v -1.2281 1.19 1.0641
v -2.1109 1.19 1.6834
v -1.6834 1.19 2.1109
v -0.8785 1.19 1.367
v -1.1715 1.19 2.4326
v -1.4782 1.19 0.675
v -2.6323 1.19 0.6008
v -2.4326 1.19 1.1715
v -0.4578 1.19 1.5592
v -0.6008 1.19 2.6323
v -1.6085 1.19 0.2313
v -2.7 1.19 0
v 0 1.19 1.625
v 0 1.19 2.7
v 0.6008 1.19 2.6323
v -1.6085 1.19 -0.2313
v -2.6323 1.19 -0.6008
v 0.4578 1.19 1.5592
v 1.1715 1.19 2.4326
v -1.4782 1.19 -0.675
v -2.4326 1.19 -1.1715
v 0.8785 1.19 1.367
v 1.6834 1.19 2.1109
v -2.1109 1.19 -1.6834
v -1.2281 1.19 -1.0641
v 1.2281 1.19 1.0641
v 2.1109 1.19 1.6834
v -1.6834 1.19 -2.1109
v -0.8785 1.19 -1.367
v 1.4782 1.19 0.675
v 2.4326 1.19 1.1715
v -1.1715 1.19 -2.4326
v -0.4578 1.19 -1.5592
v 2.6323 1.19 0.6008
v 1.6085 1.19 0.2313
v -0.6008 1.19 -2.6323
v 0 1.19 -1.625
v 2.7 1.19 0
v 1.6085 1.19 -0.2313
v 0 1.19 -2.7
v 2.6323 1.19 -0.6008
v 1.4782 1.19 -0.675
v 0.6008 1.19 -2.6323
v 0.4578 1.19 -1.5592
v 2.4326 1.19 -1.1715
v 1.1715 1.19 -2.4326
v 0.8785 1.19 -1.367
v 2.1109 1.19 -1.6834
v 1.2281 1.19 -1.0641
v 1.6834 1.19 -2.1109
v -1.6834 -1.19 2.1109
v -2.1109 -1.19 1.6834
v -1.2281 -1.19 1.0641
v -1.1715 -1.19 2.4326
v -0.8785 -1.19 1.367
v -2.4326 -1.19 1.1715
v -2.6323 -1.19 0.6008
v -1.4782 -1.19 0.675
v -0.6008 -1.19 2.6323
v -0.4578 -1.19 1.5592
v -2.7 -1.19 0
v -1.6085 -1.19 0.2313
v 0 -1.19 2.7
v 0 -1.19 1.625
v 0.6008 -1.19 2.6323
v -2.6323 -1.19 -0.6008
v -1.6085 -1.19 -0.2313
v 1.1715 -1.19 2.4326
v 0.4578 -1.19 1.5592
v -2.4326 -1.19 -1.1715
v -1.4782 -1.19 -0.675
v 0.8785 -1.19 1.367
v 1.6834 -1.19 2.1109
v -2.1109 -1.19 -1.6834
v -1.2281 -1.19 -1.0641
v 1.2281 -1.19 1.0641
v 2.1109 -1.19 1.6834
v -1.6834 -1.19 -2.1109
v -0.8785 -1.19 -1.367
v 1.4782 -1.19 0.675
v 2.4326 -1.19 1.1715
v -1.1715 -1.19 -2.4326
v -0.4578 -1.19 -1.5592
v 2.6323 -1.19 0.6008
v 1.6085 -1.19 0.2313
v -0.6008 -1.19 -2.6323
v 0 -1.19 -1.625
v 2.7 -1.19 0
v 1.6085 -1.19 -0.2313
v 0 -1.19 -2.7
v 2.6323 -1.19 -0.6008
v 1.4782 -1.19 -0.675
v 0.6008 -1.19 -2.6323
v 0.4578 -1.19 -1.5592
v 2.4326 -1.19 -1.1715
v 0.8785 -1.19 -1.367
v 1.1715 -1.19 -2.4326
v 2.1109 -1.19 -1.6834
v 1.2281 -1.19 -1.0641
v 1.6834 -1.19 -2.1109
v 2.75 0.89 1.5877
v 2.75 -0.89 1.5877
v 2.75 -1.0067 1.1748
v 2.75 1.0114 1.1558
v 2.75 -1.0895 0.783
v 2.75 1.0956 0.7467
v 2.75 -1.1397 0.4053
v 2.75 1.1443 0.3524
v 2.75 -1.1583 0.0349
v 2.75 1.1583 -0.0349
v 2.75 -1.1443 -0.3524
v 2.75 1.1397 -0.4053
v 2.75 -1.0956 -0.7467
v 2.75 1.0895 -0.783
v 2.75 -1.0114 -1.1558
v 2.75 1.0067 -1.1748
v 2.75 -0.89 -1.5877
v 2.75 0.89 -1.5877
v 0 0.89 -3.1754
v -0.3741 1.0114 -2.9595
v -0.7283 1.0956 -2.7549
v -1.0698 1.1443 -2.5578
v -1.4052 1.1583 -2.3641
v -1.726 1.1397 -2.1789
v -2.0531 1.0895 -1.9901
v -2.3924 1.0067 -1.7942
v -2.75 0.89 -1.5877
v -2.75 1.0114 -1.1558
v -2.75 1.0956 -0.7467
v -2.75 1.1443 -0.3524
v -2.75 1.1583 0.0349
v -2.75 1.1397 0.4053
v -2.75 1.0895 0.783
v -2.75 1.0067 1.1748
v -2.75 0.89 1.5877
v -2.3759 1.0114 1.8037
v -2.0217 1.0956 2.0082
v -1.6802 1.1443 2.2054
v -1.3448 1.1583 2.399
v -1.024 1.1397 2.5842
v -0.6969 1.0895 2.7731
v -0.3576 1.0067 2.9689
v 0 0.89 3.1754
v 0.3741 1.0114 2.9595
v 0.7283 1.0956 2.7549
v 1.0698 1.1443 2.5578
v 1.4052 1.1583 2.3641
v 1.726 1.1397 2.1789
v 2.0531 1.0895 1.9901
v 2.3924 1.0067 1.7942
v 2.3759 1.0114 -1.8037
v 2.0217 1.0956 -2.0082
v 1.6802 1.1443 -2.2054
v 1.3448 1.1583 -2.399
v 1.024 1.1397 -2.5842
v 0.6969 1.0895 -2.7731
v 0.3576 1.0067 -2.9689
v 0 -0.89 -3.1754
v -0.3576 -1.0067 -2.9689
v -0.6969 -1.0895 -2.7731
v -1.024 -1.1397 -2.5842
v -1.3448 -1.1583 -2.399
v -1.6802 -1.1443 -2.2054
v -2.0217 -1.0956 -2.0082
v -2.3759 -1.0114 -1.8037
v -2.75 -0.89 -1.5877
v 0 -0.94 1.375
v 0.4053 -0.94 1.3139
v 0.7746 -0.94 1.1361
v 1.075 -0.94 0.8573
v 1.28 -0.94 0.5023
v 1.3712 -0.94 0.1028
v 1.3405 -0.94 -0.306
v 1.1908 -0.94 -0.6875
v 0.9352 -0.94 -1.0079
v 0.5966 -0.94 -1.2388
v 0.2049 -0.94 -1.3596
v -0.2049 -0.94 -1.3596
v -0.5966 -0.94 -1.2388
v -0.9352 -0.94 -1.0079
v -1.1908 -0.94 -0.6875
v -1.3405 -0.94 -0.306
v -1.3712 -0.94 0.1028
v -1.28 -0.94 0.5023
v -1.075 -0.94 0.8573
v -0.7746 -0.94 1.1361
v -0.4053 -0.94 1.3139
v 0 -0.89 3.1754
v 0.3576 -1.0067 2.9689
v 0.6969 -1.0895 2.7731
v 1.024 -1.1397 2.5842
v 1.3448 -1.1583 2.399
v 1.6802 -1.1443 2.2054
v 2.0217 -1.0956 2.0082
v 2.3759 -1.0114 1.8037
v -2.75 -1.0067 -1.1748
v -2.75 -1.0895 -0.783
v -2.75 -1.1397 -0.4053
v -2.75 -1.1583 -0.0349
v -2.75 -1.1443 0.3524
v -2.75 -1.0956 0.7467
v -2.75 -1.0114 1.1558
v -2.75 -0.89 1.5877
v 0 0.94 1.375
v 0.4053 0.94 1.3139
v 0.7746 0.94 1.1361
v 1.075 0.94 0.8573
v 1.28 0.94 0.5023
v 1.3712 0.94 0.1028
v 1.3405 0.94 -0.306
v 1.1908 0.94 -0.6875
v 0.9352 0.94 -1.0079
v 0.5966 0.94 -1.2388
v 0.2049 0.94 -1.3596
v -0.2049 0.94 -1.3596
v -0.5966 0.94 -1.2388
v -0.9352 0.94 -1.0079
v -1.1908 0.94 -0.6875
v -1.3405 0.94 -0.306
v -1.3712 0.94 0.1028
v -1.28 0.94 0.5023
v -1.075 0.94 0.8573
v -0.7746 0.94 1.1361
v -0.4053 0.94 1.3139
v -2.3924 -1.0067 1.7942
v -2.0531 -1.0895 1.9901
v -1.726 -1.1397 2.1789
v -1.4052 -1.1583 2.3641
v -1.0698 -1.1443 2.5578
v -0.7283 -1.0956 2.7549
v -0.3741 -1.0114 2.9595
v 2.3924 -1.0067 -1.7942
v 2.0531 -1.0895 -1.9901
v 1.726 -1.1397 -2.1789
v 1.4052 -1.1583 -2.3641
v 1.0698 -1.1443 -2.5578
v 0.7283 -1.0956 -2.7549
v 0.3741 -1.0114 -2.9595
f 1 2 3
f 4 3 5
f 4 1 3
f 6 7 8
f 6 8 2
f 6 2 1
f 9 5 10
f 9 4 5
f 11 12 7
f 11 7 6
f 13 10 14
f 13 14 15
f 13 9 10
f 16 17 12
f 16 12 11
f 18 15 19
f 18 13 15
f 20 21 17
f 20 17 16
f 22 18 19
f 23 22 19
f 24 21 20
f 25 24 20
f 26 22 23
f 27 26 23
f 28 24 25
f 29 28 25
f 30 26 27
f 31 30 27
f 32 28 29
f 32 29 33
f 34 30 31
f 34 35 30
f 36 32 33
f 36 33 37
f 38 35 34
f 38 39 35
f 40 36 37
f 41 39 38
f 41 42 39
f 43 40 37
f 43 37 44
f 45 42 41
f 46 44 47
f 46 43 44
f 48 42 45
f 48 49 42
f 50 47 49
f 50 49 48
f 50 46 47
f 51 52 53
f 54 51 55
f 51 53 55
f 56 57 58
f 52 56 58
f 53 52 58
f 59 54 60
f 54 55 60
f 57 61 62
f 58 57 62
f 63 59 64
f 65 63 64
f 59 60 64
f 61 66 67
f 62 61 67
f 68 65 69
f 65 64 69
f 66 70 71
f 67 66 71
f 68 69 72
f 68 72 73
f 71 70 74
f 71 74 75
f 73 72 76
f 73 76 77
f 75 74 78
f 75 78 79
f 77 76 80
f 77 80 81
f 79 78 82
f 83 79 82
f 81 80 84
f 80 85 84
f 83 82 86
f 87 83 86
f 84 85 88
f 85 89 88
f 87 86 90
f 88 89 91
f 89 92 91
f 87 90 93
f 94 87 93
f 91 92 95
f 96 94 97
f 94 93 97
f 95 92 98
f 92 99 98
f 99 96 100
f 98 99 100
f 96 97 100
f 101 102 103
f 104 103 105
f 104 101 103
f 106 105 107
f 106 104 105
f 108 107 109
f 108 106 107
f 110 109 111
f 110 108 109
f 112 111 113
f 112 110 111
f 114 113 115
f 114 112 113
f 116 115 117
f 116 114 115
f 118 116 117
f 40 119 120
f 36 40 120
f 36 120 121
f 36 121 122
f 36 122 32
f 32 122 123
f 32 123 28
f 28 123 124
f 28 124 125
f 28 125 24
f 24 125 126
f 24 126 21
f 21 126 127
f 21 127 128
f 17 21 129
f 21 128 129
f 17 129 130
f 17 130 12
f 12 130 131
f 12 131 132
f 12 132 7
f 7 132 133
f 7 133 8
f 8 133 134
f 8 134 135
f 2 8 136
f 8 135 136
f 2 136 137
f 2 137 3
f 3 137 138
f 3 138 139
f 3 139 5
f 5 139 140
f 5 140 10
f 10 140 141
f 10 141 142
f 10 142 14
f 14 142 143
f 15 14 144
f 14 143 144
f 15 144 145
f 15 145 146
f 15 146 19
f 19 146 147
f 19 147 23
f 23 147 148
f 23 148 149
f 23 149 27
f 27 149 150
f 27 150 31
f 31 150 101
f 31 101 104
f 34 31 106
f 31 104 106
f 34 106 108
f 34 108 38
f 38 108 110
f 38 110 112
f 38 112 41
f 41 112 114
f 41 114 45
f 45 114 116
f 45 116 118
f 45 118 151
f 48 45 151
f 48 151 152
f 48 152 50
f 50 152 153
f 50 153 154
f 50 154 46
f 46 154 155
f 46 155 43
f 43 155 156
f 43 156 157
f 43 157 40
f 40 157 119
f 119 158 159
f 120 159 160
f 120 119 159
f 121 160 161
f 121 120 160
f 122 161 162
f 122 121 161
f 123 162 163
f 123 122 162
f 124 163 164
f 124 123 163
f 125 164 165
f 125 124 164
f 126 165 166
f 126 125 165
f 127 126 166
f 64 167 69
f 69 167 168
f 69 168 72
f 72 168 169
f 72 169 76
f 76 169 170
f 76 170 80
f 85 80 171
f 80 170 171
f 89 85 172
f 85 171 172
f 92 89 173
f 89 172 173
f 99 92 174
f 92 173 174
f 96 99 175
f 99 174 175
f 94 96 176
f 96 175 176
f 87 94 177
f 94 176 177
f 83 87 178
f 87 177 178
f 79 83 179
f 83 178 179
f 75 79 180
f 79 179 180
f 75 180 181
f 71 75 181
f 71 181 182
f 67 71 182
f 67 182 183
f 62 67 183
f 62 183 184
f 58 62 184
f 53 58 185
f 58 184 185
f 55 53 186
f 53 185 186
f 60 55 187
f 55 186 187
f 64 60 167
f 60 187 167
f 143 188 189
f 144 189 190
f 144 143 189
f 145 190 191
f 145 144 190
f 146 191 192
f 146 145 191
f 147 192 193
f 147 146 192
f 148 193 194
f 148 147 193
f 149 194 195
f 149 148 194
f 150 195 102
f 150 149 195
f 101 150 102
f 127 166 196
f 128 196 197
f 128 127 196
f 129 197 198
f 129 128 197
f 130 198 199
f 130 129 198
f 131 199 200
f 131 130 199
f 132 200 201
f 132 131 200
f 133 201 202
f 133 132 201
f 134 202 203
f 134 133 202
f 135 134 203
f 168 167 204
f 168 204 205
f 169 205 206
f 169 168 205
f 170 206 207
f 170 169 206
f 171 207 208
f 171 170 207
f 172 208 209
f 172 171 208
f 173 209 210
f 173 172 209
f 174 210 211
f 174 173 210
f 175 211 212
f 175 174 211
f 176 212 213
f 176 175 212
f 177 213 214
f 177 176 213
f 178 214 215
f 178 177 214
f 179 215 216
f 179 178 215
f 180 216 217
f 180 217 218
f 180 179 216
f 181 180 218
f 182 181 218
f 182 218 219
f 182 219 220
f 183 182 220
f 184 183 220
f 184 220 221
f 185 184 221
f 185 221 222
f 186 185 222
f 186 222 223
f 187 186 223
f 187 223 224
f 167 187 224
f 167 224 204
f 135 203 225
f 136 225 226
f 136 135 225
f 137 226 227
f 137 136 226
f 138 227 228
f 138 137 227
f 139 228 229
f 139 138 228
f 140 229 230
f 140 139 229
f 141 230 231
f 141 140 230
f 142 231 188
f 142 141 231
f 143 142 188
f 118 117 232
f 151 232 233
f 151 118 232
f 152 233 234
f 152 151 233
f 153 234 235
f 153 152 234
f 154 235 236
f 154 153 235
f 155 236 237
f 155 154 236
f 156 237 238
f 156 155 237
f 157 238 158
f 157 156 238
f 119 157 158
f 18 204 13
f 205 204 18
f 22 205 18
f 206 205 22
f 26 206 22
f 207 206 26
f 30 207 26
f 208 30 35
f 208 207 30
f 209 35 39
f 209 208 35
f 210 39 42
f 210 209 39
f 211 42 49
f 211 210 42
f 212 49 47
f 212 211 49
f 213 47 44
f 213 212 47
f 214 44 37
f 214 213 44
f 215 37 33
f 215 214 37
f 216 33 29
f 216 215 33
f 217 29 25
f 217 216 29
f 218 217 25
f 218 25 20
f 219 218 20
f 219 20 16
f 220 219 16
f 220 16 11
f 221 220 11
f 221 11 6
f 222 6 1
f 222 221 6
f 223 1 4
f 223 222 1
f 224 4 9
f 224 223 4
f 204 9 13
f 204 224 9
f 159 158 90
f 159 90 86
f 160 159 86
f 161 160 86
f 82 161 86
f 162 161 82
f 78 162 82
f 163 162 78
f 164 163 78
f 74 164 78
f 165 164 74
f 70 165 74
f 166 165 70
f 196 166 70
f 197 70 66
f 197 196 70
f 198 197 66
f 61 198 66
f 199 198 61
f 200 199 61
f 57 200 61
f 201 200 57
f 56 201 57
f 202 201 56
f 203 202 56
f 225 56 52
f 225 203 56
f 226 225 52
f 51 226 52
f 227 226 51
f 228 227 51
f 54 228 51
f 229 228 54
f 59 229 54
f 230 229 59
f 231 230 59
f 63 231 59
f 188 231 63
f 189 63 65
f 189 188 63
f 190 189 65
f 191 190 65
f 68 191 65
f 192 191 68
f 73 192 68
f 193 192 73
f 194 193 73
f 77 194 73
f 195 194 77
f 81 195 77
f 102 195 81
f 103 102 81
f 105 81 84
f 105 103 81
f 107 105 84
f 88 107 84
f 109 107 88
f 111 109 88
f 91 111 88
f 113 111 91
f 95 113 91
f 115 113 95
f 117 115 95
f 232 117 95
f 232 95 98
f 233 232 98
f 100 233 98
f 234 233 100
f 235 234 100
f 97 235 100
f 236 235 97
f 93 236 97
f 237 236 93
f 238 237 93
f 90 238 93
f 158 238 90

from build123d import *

# Parameters (mm, degrees)
SKETCH1_R           = 1.375
BOSS_EXTRUDE1_DEPTH = 1.19
CHAMFER1_SIZE       = 0.25


with BuildPart() as part:
    # Sketch1 → Boss-Extrude1 (new, symmetric)
    with BuildSketch(Plane(origin=(0, 0, 0), x_dir=(1, 0, 0), z_dir=(0, 1, 0))):
        Polygon((0, 3.175426481), (-2.75, 1.58771324), (-2.75, -1.58771324), (0, -3.175426481), (2.75, -1.58771324), (2.75, 1.58771324), align=None)
        with Locations(Location((0, 0, 0), (0, 0, 270))):
            Circle(SKETCH1_R, mode=Mode.SUBTRACT)
    extrude(amount=BOSS_EXTRUDE1_DEPTH, both=True)

    # Sketch2 → Cut-Revolve1 (revolve, cut)
    with BuildSketch(Plane(origin=(0, 0, 0), x_dir=(0, 0, -1), z_dir=(1, 0, 0))):
        Polygon((2.7, 1.19), (3.175426481, 0.89), (3.175426481, 1.19), align=None)
    cut_revolve1 = revolve(axis=Axis((0, 0, 0), (0, 1, 0)), mode=Mode.SUBTRACT)

    # Mirror1: Cut-Revolve1 across plane
    add(cut_revolve1.mirror(Plane.ZX), mode=Mode.SUBTRACT)

    # Chamfer1
    chamfer1_edges = [part.edges().sort_by_distance(p)[0] for p in [
        (0, -1.19, -1.375),
        (0, 1.19, -1.375),
    ]]
    chamfer(chamfer1_edges, length=CHAMFER1_SIZE)


solid = part.part
